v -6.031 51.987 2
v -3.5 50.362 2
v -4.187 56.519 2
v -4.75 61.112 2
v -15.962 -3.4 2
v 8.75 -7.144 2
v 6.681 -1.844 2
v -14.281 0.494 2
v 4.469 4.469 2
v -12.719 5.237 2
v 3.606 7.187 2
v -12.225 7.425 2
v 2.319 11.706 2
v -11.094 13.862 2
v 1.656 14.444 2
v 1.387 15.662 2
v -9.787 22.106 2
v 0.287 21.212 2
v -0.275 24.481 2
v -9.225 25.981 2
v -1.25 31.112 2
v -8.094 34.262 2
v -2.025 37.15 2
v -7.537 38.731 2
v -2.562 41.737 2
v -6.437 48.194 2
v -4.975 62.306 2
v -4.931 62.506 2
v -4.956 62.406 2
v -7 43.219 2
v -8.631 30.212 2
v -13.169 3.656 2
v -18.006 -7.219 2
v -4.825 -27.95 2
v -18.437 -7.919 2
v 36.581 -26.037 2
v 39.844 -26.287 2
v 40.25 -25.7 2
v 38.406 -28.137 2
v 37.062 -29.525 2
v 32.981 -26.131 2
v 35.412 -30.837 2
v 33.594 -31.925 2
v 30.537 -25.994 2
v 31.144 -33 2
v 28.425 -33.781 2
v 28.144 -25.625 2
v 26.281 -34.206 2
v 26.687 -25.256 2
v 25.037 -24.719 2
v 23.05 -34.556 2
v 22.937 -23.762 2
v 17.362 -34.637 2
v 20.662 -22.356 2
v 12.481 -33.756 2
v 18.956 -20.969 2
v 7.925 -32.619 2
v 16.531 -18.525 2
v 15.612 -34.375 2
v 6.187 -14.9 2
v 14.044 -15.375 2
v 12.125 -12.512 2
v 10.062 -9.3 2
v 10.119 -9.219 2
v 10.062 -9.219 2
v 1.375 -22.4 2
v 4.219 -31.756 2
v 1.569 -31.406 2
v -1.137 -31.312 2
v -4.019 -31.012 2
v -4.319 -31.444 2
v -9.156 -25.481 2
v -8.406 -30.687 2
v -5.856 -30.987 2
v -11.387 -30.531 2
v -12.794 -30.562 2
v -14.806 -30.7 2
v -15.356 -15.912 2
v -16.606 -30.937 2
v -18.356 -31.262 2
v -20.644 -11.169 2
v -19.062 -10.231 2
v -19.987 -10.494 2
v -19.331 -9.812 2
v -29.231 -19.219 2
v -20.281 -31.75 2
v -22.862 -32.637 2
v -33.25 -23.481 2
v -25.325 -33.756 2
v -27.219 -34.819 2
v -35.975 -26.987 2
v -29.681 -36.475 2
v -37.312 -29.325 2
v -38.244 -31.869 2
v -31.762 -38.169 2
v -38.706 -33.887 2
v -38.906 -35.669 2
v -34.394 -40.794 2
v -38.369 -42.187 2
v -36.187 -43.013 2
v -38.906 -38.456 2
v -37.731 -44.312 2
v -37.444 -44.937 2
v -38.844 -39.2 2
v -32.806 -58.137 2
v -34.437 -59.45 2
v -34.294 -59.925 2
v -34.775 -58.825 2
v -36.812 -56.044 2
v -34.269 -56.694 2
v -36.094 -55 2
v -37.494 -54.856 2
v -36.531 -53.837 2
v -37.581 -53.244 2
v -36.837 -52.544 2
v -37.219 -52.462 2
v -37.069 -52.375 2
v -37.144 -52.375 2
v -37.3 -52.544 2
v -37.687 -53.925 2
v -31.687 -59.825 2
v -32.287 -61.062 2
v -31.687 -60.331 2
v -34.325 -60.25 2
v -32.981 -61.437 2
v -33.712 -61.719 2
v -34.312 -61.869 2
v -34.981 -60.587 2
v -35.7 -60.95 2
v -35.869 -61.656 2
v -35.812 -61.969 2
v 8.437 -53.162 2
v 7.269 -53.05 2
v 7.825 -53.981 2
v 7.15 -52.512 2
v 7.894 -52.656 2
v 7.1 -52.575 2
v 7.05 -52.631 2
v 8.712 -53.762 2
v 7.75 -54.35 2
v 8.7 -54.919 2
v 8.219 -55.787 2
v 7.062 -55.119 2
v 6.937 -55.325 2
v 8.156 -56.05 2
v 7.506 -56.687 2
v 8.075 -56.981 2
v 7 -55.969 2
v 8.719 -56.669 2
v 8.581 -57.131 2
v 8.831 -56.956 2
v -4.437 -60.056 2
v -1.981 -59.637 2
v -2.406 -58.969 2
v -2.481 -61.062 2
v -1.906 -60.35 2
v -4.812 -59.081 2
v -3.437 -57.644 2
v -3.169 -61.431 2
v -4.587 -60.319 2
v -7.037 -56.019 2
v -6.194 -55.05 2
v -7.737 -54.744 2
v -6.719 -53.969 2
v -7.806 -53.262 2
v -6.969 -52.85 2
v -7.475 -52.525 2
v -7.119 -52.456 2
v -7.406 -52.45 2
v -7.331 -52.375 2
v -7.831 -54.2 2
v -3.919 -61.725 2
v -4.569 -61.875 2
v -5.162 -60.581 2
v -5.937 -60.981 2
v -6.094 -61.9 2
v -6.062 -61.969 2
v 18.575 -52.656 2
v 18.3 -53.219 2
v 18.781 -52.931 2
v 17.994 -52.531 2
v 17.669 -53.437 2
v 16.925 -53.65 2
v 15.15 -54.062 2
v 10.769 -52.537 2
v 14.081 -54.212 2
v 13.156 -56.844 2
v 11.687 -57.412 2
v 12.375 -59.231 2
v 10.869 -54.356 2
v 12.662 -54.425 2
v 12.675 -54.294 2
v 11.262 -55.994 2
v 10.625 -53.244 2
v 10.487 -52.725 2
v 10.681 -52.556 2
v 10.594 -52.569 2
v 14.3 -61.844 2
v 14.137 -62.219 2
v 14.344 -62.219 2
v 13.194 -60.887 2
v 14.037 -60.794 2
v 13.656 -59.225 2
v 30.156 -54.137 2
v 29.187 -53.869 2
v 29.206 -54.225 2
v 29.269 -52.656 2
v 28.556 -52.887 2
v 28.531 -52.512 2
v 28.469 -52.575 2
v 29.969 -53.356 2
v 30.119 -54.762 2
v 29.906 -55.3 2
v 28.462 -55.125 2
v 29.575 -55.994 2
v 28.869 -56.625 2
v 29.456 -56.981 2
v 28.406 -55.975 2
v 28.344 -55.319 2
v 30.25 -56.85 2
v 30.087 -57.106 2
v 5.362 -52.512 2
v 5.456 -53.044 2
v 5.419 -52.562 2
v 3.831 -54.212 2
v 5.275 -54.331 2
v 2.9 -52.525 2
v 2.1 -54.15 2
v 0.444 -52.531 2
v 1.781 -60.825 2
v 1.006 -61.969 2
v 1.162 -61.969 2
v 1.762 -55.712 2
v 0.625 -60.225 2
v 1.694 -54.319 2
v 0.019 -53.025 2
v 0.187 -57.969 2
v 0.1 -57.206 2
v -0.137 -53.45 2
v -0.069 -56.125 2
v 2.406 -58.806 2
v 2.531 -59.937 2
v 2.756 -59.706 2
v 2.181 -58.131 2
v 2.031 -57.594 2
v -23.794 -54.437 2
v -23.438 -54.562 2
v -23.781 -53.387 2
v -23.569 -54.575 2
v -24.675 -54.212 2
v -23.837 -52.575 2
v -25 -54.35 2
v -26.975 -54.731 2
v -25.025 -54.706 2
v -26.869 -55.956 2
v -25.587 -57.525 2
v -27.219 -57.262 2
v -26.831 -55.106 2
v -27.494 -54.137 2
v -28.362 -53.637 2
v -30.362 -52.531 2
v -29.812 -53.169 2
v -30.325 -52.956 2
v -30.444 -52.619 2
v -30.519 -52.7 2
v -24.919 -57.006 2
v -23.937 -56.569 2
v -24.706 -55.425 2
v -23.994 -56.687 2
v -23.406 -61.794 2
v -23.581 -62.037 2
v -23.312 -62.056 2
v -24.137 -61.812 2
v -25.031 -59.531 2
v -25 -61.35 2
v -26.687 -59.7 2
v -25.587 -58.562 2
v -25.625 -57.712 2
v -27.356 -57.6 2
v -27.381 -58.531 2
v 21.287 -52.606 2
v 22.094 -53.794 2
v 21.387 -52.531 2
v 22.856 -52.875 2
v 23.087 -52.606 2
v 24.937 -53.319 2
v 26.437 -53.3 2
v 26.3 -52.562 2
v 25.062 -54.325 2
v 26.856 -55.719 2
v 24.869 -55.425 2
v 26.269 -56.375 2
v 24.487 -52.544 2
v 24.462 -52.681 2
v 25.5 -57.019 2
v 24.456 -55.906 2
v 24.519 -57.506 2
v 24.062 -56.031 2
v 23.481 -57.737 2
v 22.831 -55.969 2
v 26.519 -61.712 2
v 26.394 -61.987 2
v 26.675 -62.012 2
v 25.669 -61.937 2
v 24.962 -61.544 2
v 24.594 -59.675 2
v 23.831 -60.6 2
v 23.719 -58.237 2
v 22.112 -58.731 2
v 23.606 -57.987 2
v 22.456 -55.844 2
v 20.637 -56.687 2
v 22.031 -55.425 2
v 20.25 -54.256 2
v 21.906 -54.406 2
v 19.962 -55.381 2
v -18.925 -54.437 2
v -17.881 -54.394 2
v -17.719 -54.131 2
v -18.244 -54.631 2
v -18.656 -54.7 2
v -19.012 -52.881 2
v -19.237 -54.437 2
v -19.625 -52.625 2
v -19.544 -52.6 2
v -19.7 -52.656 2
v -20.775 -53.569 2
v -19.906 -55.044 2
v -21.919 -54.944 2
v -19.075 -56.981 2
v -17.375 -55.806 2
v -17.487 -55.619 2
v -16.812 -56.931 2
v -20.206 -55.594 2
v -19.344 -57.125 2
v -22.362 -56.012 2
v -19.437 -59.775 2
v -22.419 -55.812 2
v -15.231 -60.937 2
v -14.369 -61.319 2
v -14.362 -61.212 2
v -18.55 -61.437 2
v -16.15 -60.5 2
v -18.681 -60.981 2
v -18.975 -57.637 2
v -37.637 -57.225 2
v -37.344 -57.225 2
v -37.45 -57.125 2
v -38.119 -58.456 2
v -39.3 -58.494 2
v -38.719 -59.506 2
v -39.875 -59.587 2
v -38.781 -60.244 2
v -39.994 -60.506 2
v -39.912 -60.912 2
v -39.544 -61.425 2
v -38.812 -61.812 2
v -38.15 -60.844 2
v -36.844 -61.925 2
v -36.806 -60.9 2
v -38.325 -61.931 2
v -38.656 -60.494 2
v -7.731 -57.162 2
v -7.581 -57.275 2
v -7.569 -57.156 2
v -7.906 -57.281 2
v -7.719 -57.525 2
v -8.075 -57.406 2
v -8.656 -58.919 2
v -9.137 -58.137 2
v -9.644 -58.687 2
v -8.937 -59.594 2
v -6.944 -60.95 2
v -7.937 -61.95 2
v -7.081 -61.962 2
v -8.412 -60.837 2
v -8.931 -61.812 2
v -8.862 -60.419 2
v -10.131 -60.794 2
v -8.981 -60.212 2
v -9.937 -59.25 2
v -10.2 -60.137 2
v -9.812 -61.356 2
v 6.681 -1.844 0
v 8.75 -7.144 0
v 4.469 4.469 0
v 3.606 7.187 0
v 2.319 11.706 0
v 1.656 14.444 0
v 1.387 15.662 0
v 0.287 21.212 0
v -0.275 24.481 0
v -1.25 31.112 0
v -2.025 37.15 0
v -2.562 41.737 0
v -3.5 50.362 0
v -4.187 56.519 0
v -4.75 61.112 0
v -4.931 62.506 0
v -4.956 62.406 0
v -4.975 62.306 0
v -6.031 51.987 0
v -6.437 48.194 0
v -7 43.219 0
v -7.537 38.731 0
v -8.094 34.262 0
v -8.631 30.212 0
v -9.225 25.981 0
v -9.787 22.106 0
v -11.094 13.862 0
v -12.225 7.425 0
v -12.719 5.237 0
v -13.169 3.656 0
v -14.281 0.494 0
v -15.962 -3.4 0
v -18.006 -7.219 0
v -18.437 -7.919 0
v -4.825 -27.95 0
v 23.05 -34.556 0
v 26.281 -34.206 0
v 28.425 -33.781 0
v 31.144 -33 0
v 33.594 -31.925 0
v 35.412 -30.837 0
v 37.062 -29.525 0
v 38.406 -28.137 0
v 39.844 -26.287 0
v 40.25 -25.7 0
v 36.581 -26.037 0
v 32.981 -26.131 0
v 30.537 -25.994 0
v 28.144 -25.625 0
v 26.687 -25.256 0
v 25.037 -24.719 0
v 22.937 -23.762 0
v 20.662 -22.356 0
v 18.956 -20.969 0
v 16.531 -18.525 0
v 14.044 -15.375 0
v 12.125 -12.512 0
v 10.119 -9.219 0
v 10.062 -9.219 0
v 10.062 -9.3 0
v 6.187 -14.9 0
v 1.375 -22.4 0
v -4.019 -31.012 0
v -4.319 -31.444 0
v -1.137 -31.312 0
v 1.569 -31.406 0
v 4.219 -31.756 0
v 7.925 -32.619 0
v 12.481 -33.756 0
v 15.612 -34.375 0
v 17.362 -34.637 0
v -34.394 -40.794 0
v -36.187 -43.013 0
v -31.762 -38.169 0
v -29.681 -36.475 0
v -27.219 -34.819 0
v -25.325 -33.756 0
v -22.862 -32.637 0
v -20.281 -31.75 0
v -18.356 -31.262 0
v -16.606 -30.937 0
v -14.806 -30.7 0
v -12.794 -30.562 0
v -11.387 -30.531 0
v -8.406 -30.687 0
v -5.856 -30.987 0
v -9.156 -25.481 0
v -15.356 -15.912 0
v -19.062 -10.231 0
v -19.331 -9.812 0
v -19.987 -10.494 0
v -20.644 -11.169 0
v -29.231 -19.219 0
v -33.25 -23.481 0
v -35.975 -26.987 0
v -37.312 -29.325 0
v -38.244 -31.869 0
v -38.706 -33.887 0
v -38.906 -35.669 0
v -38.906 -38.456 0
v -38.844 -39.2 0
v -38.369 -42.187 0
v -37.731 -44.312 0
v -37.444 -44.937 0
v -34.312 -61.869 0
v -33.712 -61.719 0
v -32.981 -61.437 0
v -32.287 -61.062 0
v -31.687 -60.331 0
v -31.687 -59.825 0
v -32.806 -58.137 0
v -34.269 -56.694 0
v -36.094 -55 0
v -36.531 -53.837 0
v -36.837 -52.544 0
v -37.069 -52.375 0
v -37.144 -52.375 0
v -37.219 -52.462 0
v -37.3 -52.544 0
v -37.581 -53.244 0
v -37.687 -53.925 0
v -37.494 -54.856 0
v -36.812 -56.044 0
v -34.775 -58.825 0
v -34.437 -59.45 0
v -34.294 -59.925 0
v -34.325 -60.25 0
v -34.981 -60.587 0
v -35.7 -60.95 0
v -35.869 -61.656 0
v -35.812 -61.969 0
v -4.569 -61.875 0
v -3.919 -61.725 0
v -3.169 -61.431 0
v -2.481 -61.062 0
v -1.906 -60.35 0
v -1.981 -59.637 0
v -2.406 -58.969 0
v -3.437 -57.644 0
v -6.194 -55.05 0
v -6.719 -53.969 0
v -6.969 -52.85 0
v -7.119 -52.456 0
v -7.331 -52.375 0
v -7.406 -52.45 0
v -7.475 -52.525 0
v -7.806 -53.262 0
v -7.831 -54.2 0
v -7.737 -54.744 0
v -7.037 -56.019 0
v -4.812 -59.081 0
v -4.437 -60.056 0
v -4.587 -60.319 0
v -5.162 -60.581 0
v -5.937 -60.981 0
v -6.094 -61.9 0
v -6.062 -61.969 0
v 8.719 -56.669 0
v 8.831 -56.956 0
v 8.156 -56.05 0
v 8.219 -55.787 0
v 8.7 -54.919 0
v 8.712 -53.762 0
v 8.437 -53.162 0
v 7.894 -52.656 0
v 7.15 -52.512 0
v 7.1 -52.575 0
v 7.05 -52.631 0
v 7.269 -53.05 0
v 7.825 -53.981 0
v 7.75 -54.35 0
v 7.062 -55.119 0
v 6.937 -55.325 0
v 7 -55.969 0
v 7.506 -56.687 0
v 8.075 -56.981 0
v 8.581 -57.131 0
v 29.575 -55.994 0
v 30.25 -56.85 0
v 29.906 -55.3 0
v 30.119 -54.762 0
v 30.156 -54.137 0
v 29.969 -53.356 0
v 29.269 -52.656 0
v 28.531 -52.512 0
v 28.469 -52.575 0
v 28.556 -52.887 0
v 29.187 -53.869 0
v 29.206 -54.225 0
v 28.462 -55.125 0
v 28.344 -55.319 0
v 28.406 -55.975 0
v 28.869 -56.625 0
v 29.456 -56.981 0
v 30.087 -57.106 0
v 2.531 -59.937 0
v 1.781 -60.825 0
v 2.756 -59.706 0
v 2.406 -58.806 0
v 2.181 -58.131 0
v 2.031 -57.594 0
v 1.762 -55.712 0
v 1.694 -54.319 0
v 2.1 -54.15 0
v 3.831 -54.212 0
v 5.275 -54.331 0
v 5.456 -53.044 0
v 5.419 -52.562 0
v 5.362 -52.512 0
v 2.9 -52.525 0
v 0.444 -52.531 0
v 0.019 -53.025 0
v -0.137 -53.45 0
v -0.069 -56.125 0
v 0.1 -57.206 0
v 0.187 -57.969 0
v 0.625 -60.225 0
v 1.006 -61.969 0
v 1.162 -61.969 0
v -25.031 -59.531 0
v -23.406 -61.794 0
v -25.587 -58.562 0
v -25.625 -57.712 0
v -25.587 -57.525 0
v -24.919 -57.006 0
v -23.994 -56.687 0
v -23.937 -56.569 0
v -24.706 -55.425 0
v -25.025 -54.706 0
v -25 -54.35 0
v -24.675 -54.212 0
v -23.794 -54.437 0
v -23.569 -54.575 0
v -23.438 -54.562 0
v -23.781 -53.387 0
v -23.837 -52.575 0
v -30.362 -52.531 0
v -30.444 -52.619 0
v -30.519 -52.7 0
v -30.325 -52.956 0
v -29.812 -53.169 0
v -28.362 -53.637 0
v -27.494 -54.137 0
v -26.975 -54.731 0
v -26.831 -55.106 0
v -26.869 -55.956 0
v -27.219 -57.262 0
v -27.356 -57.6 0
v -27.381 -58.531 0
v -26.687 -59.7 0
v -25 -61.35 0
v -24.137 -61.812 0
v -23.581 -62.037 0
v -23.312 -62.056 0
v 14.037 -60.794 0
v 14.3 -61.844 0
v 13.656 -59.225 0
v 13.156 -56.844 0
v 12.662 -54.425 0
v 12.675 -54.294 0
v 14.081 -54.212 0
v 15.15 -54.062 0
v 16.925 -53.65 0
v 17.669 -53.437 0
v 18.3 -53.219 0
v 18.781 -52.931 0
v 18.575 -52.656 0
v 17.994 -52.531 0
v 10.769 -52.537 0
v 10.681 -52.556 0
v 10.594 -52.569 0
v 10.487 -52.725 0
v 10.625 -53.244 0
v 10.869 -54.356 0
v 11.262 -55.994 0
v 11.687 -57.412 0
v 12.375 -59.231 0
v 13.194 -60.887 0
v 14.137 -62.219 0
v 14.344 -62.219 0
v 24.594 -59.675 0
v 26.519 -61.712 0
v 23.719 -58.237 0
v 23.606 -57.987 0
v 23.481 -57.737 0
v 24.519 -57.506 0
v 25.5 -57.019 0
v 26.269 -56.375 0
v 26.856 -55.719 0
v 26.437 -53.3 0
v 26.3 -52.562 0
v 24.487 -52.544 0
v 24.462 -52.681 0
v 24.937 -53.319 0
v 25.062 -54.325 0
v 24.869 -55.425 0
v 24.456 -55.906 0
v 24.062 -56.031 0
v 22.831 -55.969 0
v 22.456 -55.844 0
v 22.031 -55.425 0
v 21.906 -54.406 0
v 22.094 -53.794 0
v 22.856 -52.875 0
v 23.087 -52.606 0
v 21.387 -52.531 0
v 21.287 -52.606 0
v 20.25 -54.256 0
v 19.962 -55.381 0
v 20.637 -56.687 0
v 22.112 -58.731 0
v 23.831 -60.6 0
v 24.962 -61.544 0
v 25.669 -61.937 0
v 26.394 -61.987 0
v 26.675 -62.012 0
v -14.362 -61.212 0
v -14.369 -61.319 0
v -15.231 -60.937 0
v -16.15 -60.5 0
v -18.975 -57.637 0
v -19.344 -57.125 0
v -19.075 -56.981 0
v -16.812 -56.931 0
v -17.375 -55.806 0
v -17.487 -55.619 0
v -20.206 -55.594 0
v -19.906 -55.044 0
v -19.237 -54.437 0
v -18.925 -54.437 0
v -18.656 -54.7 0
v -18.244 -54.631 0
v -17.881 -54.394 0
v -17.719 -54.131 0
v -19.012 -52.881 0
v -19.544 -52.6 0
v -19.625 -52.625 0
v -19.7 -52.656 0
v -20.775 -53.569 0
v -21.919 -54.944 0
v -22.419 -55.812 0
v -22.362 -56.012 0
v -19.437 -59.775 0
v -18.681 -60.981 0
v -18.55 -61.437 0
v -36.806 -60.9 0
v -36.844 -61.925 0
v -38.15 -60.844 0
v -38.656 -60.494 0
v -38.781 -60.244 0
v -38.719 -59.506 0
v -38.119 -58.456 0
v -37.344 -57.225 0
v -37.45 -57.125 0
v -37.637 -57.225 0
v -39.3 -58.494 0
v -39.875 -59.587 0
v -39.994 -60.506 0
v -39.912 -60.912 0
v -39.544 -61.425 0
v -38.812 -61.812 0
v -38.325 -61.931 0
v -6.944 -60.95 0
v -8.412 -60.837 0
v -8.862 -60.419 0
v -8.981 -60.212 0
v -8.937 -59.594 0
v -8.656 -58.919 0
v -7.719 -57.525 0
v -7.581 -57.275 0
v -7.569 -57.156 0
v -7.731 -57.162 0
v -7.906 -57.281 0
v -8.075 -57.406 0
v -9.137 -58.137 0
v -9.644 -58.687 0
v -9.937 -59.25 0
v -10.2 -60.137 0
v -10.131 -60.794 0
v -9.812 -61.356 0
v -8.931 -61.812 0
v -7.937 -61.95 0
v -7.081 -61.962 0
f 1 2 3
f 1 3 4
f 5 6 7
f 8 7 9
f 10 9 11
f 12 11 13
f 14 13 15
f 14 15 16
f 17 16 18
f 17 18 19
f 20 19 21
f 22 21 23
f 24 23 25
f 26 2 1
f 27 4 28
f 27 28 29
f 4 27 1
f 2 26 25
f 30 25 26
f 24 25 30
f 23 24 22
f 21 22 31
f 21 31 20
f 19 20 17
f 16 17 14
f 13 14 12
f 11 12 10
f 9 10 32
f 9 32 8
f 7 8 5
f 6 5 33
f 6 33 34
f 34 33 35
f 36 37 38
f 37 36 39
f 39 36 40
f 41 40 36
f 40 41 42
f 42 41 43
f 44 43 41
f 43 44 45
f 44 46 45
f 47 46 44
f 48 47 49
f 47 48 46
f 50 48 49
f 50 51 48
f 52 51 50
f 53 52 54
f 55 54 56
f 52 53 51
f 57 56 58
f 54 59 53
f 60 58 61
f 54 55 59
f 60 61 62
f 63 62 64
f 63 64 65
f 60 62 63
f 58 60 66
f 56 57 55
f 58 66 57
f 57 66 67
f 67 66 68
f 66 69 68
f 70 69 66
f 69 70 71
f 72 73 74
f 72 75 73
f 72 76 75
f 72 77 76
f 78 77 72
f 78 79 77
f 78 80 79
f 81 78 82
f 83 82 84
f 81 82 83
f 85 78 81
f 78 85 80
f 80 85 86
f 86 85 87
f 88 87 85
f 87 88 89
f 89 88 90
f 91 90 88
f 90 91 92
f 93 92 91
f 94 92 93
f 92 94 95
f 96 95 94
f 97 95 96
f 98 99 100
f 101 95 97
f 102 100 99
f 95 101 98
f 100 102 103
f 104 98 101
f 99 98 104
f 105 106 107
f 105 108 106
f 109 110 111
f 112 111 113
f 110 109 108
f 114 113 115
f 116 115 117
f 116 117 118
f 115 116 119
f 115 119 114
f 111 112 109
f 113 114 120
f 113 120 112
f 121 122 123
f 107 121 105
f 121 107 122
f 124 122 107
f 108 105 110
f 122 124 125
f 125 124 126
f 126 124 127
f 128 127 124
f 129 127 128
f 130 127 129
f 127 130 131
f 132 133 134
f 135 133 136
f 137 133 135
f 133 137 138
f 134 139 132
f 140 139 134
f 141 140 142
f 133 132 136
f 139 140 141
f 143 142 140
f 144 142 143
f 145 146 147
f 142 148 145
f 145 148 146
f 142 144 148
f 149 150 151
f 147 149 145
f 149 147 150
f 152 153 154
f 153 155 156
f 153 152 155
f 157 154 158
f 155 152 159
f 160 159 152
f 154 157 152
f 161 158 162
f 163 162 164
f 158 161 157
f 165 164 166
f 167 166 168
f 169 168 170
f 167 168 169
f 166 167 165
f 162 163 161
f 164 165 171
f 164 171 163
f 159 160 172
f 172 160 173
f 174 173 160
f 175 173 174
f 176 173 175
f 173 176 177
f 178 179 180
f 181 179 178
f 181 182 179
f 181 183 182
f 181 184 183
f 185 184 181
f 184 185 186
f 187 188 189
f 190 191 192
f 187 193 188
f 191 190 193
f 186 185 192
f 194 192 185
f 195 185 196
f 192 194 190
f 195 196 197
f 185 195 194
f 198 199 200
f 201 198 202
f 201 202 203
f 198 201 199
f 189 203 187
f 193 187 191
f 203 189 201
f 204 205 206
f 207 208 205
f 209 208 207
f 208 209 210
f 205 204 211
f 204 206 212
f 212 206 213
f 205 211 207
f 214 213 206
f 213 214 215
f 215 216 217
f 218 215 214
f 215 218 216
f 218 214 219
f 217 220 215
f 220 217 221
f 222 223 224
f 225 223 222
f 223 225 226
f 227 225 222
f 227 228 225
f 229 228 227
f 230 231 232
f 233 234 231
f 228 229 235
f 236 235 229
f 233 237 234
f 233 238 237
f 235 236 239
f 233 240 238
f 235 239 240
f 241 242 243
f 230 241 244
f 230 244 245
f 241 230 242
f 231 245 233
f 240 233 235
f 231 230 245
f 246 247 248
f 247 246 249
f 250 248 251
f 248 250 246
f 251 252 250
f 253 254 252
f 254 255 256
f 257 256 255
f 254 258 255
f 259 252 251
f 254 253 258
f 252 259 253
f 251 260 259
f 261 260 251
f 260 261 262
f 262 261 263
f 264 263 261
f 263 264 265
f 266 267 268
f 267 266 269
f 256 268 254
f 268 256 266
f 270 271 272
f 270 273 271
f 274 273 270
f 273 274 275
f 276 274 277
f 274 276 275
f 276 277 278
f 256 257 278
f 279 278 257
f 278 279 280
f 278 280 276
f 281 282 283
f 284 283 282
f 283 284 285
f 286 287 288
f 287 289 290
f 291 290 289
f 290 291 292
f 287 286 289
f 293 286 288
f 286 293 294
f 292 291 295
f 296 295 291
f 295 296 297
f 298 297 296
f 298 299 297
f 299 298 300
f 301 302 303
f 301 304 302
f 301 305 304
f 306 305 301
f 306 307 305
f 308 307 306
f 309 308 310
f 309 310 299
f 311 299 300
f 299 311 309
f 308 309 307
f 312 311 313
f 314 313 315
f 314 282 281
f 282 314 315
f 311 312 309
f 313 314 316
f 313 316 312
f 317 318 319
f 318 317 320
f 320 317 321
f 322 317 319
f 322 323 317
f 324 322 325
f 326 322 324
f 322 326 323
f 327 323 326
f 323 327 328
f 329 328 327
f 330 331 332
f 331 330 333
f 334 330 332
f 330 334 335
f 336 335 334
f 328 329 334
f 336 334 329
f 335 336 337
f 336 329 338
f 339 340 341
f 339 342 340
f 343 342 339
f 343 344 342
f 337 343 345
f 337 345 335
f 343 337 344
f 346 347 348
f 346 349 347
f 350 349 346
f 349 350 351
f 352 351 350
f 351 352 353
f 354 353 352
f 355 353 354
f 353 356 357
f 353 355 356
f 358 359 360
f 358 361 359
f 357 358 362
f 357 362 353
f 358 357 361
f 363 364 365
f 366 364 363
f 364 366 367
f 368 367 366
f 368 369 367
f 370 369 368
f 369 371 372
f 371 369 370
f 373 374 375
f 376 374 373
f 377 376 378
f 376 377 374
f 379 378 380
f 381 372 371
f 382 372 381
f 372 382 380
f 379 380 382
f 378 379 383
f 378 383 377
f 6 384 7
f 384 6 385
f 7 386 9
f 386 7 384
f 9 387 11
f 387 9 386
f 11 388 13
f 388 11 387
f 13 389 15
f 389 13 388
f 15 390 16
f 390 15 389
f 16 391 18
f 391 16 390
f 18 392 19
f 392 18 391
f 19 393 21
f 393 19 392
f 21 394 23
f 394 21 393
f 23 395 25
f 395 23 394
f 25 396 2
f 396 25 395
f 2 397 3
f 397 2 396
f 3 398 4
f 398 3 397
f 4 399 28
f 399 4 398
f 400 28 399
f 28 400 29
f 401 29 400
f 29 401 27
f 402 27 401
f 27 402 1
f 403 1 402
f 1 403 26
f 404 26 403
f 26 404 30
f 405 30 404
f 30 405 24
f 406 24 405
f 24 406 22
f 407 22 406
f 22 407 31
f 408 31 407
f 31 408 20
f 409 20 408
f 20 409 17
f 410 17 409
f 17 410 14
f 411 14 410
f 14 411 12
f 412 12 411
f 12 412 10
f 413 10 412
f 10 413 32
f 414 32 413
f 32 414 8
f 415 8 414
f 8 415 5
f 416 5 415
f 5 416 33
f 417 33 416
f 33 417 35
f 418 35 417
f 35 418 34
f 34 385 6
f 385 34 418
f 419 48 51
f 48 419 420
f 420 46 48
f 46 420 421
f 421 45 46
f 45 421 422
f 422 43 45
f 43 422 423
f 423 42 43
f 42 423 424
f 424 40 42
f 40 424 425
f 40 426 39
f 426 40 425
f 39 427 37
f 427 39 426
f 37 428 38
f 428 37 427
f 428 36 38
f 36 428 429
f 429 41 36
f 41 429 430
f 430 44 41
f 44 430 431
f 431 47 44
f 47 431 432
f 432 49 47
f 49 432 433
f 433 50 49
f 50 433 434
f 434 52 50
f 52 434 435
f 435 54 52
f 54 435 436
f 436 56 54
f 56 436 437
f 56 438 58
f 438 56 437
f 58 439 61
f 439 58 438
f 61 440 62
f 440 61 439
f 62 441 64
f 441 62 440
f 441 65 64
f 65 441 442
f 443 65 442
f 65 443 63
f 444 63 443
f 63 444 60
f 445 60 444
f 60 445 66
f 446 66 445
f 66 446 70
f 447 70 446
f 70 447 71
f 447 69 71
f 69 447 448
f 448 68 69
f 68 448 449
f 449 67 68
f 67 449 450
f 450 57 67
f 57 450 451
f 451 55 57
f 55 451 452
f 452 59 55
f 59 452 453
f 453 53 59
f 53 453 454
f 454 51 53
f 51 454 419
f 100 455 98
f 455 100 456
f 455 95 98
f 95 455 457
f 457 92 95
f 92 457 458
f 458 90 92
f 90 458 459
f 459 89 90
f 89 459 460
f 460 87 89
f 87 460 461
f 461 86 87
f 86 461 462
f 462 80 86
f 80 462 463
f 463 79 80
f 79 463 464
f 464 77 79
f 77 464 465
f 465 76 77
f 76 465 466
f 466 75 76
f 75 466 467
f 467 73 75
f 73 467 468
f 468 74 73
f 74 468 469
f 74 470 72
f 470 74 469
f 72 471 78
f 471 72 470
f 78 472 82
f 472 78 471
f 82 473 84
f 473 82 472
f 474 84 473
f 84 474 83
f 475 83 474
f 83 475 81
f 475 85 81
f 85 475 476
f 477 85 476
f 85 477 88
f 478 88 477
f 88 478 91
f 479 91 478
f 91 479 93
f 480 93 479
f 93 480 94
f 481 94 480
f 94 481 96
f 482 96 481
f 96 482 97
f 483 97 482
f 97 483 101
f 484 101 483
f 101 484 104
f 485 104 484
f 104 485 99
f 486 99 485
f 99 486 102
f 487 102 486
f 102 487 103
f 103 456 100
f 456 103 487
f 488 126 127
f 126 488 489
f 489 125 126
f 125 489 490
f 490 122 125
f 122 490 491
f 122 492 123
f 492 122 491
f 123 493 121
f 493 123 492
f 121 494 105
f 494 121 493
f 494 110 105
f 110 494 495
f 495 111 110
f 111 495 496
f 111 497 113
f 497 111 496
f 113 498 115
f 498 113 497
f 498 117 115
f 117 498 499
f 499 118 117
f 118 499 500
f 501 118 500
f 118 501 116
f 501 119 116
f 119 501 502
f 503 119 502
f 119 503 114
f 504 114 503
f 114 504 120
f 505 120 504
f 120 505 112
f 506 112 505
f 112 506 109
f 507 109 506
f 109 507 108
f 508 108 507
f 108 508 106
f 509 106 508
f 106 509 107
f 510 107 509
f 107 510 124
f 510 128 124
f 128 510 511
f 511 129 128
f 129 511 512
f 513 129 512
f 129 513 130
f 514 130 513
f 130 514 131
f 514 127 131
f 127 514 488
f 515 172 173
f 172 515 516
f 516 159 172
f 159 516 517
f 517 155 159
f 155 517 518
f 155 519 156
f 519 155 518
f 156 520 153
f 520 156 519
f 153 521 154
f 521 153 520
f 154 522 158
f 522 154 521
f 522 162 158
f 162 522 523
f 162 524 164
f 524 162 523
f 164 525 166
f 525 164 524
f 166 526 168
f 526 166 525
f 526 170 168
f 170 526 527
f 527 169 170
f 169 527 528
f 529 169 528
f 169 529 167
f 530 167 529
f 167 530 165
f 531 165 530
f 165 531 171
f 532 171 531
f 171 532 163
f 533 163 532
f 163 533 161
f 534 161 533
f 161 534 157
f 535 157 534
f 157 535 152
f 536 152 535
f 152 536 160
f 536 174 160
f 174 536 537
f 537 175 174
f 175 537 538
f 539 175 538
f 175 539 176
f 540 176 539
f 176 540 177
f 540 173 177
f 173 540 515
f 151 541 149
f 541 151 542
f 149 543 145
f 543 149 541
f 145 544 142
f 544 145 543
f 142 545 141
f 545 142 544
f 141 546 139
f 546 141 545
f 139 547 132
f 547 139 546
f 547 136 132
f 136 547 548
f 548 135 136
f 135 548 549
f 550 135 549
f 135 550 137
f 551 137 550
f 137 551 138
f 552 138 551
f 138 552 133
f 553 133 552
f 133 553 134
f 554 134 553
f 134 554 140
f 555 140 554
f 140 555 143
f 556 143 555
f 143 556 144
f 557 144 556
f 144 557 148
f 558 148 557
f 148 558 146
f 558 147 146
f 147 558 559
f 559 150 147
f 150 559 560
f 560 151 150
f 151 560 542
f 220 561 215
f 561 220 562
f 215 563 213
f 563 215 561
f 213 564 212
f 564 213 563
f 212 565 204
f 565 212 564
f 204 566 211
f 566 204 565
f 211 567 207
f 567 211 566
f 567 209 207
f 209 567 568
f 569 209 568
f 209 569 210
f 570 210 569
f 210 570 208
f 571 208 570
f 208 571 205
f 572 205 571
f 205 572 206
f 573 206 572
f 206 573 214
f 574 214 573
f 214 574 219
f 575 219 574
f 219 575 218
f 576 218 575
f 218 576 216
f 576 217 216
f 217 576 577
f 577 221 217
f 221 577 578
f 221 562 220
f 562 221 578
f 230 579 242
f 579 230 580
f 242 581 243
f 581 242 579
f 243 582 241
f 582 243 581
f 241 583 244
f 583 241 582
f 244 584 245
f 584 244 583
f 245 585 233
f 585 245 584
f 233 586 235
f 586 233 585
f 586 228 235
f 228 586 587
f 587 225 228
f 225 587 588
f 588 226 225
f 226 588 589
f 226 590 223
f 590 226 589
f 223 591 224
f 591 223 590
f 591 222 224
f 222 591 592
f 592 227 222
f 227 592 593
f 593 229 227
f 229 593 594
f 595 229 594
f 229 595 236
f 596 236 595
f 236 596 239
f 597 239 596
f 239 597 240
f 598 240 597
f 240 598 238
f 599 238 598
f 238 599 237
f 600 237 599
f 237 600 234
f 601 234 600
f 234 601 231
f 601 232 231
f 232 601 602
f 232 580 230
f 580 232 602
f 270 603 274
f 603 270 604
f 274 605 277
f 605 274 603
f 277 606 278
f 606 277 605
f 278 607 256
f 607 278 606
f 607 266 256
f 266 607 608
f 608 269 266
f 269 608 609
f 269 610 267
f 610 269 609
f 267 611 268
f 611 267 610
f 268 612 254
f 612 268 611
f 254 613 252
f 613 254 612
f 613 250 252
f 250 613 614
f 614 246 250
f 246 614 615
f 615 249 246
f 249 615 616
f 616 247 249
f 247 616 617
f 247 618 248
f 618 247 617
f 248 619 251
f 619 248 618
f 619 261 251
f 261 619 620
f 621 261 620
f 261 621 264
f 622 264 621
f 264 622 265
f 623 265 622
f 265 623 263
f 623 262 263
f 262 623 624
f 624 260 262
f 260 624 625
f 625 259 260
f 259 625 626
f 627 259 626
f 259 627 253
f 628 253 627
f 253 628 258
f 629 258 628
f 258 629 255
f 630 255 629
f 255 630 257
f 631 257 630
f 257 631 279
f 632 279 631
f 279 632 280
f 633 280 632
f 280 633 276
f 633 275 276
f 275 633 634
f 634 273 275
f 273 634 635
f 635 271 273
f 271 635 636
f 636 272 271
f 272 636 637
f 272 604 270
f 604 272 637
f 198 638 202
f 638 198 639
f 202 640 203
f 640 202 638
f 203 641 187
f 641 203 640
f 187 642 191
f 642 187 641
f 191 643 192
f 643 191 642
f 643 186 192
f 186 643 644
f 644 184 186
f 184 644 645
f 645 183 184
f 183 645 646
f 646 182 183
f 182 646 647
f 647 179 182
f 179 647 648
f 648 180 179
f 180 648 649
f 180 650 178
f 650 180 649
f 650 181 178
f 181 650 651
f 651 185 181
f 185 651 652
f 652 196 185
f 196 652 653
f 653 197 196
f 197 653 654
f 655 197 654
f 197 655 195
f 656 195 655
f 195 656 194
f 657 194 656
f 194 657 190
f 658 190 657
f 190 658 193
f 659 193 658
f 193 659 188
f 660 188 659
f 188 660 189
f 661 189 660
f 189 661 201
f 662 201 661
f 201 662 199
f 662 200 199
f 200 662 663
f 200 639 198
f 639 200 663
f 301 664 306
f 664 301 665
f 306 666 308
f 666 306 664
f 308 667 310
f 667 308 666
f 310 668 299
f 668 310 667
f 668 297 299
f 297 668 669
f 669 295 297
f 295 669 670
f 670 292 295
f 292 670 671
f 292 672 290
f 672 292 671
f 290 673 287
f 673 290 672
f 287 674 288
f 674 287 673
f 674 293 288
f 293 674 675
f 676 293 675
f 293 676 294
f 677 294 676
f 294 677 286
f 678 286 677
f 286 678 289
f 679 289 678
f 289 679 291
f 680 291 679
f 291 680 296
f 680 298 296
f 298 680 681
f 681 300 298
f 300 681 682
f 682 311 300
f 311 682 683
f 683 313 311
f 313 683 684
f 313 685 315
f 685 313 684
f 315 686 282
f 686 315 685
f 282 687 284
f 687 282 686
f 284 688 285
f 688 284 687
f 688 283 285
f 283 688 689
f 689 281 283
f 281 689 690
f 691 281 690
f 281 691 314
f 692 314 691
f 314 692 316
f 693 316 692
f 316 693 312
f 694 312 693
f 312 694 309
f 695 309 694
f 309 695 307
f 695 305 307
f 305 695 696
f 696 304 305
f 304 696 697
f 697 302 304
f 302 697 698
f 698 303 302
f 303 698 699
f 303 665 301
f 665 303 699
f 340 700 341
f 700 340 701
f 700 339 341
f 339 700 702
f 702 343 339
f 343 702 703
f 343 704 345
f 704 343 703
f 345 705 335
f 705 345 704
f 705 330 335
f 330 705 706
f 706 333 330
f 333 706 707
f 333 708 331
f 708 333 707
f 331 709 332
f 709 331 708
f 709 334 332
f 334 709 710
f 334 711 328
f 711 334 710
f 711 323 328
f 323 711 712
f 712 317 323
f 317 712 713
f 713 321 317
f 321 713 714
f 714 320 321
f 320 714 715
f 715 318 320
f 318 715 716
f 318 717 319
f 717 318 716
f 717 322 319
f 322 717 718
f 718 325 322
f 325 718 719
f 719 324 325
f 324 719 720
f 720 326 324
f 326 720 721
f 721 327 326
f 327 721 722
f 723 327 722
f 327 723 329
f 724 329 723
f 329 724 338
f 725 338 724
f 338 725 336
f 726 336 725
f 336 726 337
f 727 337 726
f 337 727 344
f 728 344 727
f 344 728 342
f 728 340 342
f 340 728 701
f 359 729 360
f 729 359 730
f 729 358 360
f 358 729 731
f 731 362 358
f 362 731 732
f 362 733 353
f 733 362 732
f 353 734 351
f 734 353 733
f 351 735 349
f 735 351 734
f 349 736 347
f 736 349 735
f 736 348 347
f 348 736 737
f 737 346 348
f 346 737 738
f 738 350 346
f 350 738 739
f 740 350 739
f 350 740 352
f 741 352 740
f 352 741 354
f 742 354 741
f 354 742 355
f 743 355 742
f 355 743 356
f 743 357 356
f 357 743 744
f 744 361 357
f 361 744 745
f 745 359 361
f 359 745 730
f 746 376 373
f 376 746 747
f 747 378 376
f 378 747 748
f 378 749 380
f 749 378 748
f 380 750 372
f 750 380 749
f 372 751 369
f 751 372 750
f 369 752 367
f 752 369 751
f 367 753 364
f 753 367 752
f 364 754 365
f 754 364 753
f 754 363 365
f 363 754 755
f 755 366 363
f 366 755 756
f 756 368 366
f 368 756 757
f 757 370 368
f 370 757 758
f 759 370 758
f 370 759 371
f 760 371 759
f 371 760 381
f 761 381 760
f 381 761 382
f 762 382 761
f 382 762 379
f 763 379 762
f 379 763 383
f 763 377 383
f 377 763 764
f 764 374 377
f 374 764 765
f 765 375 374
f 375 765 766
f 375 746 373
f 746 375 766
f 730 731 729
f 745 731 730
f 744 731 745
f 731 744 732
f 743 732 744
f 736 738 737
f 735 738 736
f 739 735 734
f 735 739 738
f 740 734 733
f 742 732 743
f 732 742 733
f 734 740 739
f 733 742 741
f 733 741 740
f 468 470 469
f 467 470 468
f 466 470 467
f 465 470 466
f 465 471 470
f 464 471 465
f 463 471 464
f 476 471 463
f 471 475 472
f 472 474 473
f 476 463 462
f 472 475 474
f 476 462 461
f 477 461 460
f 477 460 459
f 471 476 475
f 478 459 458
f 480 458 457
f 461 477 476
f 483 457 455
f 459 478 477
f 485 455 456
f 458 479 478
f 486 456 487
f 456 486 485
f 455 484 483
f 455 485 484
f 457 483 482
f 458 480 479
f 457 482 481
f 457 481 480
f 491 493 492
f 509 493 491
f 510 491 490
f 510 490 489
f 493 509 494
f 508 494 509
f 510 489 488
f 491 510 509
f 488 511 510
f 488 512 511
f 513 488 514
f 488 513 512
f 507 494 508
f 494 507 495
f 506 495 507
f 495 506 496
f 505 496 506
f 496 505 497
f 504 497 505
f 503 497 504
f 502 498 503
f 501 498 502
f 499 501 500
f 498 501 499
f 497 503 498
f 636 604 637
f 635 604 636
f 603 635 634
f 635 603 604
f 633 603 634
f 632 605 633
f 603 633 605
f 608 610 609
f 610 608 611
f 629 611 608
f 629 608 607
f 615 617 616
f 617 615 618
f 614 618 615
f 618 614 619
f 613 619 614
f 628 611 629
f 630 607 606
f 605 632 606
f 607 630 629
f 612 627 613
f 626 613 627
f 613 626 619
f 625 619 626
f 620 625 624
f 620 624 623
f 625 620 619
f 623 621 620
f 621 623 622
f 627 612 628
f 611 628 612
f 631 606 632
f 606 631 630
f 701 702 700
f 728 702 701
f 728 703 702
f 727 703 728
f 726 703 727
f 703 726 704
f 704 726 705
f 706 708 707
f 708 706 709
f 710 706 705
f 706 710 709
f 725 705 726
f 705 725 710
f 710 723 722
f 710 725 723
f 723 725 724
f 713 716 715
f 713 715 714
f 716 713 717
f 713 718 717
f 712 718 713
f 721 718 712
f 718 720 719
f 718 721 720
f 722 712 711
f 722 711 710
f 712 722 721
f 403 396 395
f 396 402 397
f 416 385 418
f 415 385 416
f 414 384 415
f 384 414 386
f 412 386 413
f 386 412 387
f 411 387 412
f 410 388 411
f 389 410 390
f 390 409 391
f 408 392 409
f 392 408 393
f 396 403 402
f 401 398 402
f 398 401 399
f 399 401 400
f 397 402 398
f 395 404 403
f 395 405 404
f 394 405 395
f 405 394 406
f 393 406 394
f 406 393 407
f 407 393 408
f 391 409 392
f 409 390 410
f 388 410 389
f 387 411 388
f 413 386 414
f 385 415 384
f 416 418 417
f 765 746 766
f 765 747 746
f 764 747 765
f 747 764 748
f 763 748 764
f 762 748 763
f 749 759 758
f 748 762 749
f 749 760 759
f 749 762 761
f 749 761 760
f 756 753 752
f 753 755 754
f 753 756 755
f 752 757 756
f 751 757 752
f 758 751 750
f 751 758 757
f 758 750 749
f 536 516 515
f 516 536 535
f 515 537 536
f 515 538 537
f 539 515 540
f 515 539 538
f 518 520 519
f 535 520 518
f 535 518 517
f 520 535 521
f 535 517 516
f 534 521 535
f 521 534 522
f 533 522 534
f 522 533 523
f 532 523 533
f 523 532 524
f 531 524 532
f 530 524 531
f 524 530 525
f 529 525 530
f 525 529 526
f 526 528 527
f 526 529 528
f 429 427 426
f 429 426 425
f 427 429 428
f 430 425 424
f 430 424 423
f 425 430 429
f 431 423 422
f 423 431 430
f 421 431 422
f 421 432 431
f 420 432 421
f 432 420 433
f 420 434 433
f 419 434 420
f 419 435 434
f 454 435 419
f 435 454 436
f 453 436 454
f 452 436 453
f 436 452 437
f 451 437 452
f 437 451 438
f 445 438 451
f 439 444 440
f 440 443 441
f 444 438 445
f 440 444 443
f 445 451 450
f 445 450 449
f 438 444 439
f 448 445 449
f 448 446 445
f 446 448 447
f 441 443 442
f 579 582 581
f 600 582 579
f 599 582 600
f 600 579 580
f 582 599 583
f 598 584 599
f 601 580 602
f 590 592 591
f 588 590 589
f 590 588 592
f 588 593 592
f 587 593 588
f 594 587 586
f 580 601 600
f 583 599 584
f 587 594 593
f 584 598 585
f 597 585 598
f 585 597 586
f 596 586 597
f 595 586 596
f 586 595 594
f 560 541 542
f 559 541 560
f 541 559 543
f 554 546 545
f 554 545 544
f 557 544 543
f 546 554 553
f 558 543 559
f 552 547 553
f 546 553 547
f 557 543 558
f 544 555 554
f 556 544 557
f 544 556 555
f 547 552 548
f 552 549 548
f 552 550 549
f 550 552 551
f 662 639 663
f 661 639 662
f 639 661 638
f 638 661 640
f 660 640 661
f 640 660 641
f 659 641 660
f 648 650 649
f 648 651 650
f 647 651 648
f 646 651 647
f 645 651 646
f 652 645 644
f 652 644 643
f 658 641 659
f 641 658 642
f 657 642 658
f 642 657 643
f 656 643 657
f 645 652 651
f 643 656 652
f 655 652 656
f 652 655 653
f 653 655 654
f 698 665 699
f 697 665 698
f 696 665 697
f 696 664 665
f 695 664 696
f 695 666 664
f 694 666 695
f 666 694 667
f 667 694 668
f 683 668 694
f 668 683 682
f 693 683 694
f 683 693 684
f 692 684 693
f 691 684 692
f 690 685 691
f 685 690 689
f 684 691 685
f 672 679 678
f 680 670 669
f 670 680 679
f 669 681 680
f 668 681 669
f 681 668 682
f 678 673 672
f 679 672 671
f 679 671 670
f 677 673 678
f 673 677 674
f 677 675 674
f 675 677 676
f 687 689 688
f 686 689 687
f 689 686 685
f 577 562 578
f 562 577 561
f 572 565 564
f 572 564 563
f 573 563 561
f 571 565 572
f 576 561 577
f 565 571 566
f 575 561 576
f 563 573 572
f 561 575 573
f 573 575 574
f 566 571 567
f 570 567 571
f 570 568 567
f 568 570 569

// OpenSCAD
module bafb32bac3e4ac4a1b33ecb9e5d369b8_1()
{
 /* Generated by trace2scad version 20150415
    http://aggregate.org/MAKE/TRACE2SCAD/
    Optimized model has 387/4796 original points
 */
 color([0.48, 0.48, 0.48])
 assign(minx=0) /* polygon minx=39 */
 assign(miny=0) /* polygon miny=45 */
 assign(maxx=12880) /* polygon maxx=12880 */
 assign(maxy=20000) /* polygon maxy=20001 */
 assign(dx=maxx-minx)
 assign(dy=maxy-miny)
 assign(maxd=((dx>dy)?dx:dy))
 scale([1/maxd, 1/maxd, 1])
 translate([-minx-dx/2, -miny-dy/2, 0])
 linear_extrude(height=1, convexity=387)
 union() {
  union() {
   polygon([[5647,19985],[5644,19969],[5475,18318],[5410,17711],[5320,16915],[5234,16197],[5145,15482],[5059,14834],[4964,14157],[4874,13537],[4665,12218],[4484,11188],[4405,10838],[4333,10585],[4155,10079],[3886,9456],[3559,8845],[3490,8733],[5668,5528],[7840,8857],[7509,9705],[7155,10715],[7017,11150],[6811,11873],[6705,12311],[6662,12506],[6486,13394],[6396,13917],[6240,14978],[6116,15944],[6030,16678],[5880,18058],[5770,19043],[5680,19778],[5651,20001]], convexity=6);
   polygon([[8050,8518],[8050,8512],[7430,7616],[6660,6416],[5797,5038],[5749,4969],[6258,4990],[6691,4975],[7115,4919],[7708,4781],[8437,4599],[8938,4500],[9218,4458],[10128,4471],[10645,4527],[10988,4595],[11423,4720],[11815,4892],[12106,5066],[12370,5276],[12585,5498],[12815,5794],[12880,5888],[12293,5834],[11717,5819],[11326,5841],[10943,5900],[10710,5959],[10446,6045],[10110,6198],[9746,6423],[9473,6645],[9085,7036],[8687,7540],[8380,7998],[8059,8525],[8050,8525]], convexity=9);
   polygon([[3242,8321],[3137,8213],[1763,6925],[1120,6243],[684,5682],[470,5308],[321,4901],[247,4578],[215,4293],[215,3847],[225,3728],[301,3250],[403,2910],[449,2810],[650,3118],[937,3473],[1358,3893],[1691,4164],[2085,4429],[2388,4599],[2782,4778],[3195,4920],[3503,4998],[3783,5050],[4071,5088],[4393,5110],[4618,5115],[5095,5090],[5503,5042],[4975,5923],[3983,7454],[3390,8363],[3347,8430]], convexity=7);
   polygon([[485,1606],[472,1593],[427,1481],[410,1372],[441,1223],[550,1033],[876,588],[930,488],[953,412],[948,360],[843,306],[728,248],[701,135],[710,85],[950,101],[1046,125],[1163,170],[1274,230],[1370,347],[1370,428],[1191,698],[957,929],[665,1200],[595,1386],[546,1593],[509,1620],[497,1620]], convexity=8);
   polygon([[5255,1608],[5244,1596],[5191,1478],[5187,1328],[5202,1241],[5314,1037],[5670,547],[5730,391],[5706,349],[5614,307],[5490,243],[5465,96],[5470,85],[5709,100],[5813,124],[5933,171],[6043,230],[6135,344],[6123,458],[6055,565],[5890,777],[5449,1192],[5365,1365],[5325,1544],[5301,1607],[5267,1620]], convexity=8);
   polygon([[6904,1596],[6511,1595],[6443,1516],[6418,1448],[6429,1020],[6456,847],[6470,725],[6540,364],[6601,85],[6626,85],[6725,268],[6845,410],[6881,447],[6825,591],[6789,699],[6765,785],[6722,1086],[6711,1309],[6776,1336],[7053,1326],[7284,1307],[7313,1513],[7307,1590],[7298,1598]], convexity=10);
   polygon([[7576,1588],[7568,1579],[7603,1512],[7692,1363],[7680,1304],[7570,1181],[7550,1148],[7560,1045],[7641,930],[7732,883],[7813,859],[7853,887],[7835,933],[7745,1032],[7755,1074],[7832,1213],[7834,1398],[7790,1494],[7703,1575],[7584,1598]], convexity=10);
   polygon([[11000,1593],[10995,1588],[11009,1538],[11110,1381],[11113,1324],[10994,1180],[10975,1149],[10985,1044],[11059,940],[11153,883],[11254,863],[11280,904],[11172,1041],[11225,1152],[11259,1238],[11265,1338],[11235,1463],[11123,1575],[11005,1598]], convexity=10);
   polygon([[1569,1581],[1557,1568],[1588,1527],[1670,1493],[1902,1418],[2041,1338],[2124,1243],[2147,1183],[2141,1047],[2085,838],[2063,784],[2059,635],[2170,448],[2440,184],[2578,110],[2667,74],[2710,71],[2695,113],[2435,475],[2346,630],[2340,766],[2346,796],[2453,879],[2601,930],[2610,949],[2487,1132],[2436,1247],[2440,1304],[2492,1326],[2633,1290],[2669,1268],[2690,1270],[2635,1458],[2626,1588],[1582,1595]], convexity=13);
   polygon([[8149,1591],[8135,1589],[8118,1564],[8140,1481],[8179,1303],[8242,1041],[8310,814],[8420,523],[8551,258],[8702,45],[8735,45],[8728,105],[8686,273],[8625,524],[8545,905],[8466,1292],[8468,1313],[8693,1326],[8864,1350],[9148,1416],[9267,1450],[9368,1485],[9445,1531],[9412,1575],[9319,1595],[8163,1594]], convexity=9);
   polygon([[9854,1589],[9846,1583],[9680,1319],[9634,1139],[9742,930],[9978,603],[10253,304],[10434,153],[10547,90],[10663,82],[10708,78],[10683,126],[10375,452],[10235,682],[10217,722],[10197,762],[10363,799],[10520,877],[10643,980],[10737,1085],[10670,1472],[10648,1590],[10358,1593],[10354,1571],[10430,1469],[10450,1308],[10419,1132],[10353,1055],[10290,1035],[10093,1045],[10033,1065],[9965,1132],[9945,1295],[9975,1393],[10097,1540],[10134,1583],[9862,1595]], convexity=13);
   polygon([[3300,1580],[3288,1575],[3116,1429],[2933,1209],[2853,1070],[2862,1038],[3330,436],[3451,243],[3472,170],[4141,189],[4142,206],[4003,250],[3856,320],[3404,778],[3345,860],[3388,883],[3750,891],[3660,1071],[3642,1101],[3207,1105],[3255,1193],[3362,1290],[3412,1290],[3455,1248],[3521,1259],[3579,1297],[3605,1339],[3398,1539],[3313,1584]], convexity=12);
   polygon([[433,852],[418,844],[152,641],[60,466],[41,319],[54,254],[113,172],[230,110],[308,91],[545,92],[551,256],[336,265],[255,321],[235,361],[245,479],[341,647],[465,844],[448,860]], convexity=8);
   polygon([[5175,835],[5148,815],[4978,698],[4897,610],[4850,520],[4808,378],[4819,273],[4870,183],[5011,110],[5170,88],[5307,86],[5329,248],[5094,266],[5022,333],[5003,366],[5010,465],[5055,573],[5205,796],[5227,836],[5229,855],[5203,854]], convexity=8);
  }
 }
}

module bafb32bac3e4ac4a1b33ecb9e5d369b8()
{
 /* all layers combined, scaled to within a 1mm cube */
 scale([1, 1, 1/1])
 difference() {
  union() {
   scale([1,1,2]) translate([0,0,-0.5]) bafb32bac3e4ac4a1b33ecb9e5d369b8_1();
  }
  translate([0,0,-2]) cube([2,2,4],center=true);
 }
}

scale([125, 125, 2]) {
	bafb32bac3e4ac4a1b33ecb9e5d369b8();
}
